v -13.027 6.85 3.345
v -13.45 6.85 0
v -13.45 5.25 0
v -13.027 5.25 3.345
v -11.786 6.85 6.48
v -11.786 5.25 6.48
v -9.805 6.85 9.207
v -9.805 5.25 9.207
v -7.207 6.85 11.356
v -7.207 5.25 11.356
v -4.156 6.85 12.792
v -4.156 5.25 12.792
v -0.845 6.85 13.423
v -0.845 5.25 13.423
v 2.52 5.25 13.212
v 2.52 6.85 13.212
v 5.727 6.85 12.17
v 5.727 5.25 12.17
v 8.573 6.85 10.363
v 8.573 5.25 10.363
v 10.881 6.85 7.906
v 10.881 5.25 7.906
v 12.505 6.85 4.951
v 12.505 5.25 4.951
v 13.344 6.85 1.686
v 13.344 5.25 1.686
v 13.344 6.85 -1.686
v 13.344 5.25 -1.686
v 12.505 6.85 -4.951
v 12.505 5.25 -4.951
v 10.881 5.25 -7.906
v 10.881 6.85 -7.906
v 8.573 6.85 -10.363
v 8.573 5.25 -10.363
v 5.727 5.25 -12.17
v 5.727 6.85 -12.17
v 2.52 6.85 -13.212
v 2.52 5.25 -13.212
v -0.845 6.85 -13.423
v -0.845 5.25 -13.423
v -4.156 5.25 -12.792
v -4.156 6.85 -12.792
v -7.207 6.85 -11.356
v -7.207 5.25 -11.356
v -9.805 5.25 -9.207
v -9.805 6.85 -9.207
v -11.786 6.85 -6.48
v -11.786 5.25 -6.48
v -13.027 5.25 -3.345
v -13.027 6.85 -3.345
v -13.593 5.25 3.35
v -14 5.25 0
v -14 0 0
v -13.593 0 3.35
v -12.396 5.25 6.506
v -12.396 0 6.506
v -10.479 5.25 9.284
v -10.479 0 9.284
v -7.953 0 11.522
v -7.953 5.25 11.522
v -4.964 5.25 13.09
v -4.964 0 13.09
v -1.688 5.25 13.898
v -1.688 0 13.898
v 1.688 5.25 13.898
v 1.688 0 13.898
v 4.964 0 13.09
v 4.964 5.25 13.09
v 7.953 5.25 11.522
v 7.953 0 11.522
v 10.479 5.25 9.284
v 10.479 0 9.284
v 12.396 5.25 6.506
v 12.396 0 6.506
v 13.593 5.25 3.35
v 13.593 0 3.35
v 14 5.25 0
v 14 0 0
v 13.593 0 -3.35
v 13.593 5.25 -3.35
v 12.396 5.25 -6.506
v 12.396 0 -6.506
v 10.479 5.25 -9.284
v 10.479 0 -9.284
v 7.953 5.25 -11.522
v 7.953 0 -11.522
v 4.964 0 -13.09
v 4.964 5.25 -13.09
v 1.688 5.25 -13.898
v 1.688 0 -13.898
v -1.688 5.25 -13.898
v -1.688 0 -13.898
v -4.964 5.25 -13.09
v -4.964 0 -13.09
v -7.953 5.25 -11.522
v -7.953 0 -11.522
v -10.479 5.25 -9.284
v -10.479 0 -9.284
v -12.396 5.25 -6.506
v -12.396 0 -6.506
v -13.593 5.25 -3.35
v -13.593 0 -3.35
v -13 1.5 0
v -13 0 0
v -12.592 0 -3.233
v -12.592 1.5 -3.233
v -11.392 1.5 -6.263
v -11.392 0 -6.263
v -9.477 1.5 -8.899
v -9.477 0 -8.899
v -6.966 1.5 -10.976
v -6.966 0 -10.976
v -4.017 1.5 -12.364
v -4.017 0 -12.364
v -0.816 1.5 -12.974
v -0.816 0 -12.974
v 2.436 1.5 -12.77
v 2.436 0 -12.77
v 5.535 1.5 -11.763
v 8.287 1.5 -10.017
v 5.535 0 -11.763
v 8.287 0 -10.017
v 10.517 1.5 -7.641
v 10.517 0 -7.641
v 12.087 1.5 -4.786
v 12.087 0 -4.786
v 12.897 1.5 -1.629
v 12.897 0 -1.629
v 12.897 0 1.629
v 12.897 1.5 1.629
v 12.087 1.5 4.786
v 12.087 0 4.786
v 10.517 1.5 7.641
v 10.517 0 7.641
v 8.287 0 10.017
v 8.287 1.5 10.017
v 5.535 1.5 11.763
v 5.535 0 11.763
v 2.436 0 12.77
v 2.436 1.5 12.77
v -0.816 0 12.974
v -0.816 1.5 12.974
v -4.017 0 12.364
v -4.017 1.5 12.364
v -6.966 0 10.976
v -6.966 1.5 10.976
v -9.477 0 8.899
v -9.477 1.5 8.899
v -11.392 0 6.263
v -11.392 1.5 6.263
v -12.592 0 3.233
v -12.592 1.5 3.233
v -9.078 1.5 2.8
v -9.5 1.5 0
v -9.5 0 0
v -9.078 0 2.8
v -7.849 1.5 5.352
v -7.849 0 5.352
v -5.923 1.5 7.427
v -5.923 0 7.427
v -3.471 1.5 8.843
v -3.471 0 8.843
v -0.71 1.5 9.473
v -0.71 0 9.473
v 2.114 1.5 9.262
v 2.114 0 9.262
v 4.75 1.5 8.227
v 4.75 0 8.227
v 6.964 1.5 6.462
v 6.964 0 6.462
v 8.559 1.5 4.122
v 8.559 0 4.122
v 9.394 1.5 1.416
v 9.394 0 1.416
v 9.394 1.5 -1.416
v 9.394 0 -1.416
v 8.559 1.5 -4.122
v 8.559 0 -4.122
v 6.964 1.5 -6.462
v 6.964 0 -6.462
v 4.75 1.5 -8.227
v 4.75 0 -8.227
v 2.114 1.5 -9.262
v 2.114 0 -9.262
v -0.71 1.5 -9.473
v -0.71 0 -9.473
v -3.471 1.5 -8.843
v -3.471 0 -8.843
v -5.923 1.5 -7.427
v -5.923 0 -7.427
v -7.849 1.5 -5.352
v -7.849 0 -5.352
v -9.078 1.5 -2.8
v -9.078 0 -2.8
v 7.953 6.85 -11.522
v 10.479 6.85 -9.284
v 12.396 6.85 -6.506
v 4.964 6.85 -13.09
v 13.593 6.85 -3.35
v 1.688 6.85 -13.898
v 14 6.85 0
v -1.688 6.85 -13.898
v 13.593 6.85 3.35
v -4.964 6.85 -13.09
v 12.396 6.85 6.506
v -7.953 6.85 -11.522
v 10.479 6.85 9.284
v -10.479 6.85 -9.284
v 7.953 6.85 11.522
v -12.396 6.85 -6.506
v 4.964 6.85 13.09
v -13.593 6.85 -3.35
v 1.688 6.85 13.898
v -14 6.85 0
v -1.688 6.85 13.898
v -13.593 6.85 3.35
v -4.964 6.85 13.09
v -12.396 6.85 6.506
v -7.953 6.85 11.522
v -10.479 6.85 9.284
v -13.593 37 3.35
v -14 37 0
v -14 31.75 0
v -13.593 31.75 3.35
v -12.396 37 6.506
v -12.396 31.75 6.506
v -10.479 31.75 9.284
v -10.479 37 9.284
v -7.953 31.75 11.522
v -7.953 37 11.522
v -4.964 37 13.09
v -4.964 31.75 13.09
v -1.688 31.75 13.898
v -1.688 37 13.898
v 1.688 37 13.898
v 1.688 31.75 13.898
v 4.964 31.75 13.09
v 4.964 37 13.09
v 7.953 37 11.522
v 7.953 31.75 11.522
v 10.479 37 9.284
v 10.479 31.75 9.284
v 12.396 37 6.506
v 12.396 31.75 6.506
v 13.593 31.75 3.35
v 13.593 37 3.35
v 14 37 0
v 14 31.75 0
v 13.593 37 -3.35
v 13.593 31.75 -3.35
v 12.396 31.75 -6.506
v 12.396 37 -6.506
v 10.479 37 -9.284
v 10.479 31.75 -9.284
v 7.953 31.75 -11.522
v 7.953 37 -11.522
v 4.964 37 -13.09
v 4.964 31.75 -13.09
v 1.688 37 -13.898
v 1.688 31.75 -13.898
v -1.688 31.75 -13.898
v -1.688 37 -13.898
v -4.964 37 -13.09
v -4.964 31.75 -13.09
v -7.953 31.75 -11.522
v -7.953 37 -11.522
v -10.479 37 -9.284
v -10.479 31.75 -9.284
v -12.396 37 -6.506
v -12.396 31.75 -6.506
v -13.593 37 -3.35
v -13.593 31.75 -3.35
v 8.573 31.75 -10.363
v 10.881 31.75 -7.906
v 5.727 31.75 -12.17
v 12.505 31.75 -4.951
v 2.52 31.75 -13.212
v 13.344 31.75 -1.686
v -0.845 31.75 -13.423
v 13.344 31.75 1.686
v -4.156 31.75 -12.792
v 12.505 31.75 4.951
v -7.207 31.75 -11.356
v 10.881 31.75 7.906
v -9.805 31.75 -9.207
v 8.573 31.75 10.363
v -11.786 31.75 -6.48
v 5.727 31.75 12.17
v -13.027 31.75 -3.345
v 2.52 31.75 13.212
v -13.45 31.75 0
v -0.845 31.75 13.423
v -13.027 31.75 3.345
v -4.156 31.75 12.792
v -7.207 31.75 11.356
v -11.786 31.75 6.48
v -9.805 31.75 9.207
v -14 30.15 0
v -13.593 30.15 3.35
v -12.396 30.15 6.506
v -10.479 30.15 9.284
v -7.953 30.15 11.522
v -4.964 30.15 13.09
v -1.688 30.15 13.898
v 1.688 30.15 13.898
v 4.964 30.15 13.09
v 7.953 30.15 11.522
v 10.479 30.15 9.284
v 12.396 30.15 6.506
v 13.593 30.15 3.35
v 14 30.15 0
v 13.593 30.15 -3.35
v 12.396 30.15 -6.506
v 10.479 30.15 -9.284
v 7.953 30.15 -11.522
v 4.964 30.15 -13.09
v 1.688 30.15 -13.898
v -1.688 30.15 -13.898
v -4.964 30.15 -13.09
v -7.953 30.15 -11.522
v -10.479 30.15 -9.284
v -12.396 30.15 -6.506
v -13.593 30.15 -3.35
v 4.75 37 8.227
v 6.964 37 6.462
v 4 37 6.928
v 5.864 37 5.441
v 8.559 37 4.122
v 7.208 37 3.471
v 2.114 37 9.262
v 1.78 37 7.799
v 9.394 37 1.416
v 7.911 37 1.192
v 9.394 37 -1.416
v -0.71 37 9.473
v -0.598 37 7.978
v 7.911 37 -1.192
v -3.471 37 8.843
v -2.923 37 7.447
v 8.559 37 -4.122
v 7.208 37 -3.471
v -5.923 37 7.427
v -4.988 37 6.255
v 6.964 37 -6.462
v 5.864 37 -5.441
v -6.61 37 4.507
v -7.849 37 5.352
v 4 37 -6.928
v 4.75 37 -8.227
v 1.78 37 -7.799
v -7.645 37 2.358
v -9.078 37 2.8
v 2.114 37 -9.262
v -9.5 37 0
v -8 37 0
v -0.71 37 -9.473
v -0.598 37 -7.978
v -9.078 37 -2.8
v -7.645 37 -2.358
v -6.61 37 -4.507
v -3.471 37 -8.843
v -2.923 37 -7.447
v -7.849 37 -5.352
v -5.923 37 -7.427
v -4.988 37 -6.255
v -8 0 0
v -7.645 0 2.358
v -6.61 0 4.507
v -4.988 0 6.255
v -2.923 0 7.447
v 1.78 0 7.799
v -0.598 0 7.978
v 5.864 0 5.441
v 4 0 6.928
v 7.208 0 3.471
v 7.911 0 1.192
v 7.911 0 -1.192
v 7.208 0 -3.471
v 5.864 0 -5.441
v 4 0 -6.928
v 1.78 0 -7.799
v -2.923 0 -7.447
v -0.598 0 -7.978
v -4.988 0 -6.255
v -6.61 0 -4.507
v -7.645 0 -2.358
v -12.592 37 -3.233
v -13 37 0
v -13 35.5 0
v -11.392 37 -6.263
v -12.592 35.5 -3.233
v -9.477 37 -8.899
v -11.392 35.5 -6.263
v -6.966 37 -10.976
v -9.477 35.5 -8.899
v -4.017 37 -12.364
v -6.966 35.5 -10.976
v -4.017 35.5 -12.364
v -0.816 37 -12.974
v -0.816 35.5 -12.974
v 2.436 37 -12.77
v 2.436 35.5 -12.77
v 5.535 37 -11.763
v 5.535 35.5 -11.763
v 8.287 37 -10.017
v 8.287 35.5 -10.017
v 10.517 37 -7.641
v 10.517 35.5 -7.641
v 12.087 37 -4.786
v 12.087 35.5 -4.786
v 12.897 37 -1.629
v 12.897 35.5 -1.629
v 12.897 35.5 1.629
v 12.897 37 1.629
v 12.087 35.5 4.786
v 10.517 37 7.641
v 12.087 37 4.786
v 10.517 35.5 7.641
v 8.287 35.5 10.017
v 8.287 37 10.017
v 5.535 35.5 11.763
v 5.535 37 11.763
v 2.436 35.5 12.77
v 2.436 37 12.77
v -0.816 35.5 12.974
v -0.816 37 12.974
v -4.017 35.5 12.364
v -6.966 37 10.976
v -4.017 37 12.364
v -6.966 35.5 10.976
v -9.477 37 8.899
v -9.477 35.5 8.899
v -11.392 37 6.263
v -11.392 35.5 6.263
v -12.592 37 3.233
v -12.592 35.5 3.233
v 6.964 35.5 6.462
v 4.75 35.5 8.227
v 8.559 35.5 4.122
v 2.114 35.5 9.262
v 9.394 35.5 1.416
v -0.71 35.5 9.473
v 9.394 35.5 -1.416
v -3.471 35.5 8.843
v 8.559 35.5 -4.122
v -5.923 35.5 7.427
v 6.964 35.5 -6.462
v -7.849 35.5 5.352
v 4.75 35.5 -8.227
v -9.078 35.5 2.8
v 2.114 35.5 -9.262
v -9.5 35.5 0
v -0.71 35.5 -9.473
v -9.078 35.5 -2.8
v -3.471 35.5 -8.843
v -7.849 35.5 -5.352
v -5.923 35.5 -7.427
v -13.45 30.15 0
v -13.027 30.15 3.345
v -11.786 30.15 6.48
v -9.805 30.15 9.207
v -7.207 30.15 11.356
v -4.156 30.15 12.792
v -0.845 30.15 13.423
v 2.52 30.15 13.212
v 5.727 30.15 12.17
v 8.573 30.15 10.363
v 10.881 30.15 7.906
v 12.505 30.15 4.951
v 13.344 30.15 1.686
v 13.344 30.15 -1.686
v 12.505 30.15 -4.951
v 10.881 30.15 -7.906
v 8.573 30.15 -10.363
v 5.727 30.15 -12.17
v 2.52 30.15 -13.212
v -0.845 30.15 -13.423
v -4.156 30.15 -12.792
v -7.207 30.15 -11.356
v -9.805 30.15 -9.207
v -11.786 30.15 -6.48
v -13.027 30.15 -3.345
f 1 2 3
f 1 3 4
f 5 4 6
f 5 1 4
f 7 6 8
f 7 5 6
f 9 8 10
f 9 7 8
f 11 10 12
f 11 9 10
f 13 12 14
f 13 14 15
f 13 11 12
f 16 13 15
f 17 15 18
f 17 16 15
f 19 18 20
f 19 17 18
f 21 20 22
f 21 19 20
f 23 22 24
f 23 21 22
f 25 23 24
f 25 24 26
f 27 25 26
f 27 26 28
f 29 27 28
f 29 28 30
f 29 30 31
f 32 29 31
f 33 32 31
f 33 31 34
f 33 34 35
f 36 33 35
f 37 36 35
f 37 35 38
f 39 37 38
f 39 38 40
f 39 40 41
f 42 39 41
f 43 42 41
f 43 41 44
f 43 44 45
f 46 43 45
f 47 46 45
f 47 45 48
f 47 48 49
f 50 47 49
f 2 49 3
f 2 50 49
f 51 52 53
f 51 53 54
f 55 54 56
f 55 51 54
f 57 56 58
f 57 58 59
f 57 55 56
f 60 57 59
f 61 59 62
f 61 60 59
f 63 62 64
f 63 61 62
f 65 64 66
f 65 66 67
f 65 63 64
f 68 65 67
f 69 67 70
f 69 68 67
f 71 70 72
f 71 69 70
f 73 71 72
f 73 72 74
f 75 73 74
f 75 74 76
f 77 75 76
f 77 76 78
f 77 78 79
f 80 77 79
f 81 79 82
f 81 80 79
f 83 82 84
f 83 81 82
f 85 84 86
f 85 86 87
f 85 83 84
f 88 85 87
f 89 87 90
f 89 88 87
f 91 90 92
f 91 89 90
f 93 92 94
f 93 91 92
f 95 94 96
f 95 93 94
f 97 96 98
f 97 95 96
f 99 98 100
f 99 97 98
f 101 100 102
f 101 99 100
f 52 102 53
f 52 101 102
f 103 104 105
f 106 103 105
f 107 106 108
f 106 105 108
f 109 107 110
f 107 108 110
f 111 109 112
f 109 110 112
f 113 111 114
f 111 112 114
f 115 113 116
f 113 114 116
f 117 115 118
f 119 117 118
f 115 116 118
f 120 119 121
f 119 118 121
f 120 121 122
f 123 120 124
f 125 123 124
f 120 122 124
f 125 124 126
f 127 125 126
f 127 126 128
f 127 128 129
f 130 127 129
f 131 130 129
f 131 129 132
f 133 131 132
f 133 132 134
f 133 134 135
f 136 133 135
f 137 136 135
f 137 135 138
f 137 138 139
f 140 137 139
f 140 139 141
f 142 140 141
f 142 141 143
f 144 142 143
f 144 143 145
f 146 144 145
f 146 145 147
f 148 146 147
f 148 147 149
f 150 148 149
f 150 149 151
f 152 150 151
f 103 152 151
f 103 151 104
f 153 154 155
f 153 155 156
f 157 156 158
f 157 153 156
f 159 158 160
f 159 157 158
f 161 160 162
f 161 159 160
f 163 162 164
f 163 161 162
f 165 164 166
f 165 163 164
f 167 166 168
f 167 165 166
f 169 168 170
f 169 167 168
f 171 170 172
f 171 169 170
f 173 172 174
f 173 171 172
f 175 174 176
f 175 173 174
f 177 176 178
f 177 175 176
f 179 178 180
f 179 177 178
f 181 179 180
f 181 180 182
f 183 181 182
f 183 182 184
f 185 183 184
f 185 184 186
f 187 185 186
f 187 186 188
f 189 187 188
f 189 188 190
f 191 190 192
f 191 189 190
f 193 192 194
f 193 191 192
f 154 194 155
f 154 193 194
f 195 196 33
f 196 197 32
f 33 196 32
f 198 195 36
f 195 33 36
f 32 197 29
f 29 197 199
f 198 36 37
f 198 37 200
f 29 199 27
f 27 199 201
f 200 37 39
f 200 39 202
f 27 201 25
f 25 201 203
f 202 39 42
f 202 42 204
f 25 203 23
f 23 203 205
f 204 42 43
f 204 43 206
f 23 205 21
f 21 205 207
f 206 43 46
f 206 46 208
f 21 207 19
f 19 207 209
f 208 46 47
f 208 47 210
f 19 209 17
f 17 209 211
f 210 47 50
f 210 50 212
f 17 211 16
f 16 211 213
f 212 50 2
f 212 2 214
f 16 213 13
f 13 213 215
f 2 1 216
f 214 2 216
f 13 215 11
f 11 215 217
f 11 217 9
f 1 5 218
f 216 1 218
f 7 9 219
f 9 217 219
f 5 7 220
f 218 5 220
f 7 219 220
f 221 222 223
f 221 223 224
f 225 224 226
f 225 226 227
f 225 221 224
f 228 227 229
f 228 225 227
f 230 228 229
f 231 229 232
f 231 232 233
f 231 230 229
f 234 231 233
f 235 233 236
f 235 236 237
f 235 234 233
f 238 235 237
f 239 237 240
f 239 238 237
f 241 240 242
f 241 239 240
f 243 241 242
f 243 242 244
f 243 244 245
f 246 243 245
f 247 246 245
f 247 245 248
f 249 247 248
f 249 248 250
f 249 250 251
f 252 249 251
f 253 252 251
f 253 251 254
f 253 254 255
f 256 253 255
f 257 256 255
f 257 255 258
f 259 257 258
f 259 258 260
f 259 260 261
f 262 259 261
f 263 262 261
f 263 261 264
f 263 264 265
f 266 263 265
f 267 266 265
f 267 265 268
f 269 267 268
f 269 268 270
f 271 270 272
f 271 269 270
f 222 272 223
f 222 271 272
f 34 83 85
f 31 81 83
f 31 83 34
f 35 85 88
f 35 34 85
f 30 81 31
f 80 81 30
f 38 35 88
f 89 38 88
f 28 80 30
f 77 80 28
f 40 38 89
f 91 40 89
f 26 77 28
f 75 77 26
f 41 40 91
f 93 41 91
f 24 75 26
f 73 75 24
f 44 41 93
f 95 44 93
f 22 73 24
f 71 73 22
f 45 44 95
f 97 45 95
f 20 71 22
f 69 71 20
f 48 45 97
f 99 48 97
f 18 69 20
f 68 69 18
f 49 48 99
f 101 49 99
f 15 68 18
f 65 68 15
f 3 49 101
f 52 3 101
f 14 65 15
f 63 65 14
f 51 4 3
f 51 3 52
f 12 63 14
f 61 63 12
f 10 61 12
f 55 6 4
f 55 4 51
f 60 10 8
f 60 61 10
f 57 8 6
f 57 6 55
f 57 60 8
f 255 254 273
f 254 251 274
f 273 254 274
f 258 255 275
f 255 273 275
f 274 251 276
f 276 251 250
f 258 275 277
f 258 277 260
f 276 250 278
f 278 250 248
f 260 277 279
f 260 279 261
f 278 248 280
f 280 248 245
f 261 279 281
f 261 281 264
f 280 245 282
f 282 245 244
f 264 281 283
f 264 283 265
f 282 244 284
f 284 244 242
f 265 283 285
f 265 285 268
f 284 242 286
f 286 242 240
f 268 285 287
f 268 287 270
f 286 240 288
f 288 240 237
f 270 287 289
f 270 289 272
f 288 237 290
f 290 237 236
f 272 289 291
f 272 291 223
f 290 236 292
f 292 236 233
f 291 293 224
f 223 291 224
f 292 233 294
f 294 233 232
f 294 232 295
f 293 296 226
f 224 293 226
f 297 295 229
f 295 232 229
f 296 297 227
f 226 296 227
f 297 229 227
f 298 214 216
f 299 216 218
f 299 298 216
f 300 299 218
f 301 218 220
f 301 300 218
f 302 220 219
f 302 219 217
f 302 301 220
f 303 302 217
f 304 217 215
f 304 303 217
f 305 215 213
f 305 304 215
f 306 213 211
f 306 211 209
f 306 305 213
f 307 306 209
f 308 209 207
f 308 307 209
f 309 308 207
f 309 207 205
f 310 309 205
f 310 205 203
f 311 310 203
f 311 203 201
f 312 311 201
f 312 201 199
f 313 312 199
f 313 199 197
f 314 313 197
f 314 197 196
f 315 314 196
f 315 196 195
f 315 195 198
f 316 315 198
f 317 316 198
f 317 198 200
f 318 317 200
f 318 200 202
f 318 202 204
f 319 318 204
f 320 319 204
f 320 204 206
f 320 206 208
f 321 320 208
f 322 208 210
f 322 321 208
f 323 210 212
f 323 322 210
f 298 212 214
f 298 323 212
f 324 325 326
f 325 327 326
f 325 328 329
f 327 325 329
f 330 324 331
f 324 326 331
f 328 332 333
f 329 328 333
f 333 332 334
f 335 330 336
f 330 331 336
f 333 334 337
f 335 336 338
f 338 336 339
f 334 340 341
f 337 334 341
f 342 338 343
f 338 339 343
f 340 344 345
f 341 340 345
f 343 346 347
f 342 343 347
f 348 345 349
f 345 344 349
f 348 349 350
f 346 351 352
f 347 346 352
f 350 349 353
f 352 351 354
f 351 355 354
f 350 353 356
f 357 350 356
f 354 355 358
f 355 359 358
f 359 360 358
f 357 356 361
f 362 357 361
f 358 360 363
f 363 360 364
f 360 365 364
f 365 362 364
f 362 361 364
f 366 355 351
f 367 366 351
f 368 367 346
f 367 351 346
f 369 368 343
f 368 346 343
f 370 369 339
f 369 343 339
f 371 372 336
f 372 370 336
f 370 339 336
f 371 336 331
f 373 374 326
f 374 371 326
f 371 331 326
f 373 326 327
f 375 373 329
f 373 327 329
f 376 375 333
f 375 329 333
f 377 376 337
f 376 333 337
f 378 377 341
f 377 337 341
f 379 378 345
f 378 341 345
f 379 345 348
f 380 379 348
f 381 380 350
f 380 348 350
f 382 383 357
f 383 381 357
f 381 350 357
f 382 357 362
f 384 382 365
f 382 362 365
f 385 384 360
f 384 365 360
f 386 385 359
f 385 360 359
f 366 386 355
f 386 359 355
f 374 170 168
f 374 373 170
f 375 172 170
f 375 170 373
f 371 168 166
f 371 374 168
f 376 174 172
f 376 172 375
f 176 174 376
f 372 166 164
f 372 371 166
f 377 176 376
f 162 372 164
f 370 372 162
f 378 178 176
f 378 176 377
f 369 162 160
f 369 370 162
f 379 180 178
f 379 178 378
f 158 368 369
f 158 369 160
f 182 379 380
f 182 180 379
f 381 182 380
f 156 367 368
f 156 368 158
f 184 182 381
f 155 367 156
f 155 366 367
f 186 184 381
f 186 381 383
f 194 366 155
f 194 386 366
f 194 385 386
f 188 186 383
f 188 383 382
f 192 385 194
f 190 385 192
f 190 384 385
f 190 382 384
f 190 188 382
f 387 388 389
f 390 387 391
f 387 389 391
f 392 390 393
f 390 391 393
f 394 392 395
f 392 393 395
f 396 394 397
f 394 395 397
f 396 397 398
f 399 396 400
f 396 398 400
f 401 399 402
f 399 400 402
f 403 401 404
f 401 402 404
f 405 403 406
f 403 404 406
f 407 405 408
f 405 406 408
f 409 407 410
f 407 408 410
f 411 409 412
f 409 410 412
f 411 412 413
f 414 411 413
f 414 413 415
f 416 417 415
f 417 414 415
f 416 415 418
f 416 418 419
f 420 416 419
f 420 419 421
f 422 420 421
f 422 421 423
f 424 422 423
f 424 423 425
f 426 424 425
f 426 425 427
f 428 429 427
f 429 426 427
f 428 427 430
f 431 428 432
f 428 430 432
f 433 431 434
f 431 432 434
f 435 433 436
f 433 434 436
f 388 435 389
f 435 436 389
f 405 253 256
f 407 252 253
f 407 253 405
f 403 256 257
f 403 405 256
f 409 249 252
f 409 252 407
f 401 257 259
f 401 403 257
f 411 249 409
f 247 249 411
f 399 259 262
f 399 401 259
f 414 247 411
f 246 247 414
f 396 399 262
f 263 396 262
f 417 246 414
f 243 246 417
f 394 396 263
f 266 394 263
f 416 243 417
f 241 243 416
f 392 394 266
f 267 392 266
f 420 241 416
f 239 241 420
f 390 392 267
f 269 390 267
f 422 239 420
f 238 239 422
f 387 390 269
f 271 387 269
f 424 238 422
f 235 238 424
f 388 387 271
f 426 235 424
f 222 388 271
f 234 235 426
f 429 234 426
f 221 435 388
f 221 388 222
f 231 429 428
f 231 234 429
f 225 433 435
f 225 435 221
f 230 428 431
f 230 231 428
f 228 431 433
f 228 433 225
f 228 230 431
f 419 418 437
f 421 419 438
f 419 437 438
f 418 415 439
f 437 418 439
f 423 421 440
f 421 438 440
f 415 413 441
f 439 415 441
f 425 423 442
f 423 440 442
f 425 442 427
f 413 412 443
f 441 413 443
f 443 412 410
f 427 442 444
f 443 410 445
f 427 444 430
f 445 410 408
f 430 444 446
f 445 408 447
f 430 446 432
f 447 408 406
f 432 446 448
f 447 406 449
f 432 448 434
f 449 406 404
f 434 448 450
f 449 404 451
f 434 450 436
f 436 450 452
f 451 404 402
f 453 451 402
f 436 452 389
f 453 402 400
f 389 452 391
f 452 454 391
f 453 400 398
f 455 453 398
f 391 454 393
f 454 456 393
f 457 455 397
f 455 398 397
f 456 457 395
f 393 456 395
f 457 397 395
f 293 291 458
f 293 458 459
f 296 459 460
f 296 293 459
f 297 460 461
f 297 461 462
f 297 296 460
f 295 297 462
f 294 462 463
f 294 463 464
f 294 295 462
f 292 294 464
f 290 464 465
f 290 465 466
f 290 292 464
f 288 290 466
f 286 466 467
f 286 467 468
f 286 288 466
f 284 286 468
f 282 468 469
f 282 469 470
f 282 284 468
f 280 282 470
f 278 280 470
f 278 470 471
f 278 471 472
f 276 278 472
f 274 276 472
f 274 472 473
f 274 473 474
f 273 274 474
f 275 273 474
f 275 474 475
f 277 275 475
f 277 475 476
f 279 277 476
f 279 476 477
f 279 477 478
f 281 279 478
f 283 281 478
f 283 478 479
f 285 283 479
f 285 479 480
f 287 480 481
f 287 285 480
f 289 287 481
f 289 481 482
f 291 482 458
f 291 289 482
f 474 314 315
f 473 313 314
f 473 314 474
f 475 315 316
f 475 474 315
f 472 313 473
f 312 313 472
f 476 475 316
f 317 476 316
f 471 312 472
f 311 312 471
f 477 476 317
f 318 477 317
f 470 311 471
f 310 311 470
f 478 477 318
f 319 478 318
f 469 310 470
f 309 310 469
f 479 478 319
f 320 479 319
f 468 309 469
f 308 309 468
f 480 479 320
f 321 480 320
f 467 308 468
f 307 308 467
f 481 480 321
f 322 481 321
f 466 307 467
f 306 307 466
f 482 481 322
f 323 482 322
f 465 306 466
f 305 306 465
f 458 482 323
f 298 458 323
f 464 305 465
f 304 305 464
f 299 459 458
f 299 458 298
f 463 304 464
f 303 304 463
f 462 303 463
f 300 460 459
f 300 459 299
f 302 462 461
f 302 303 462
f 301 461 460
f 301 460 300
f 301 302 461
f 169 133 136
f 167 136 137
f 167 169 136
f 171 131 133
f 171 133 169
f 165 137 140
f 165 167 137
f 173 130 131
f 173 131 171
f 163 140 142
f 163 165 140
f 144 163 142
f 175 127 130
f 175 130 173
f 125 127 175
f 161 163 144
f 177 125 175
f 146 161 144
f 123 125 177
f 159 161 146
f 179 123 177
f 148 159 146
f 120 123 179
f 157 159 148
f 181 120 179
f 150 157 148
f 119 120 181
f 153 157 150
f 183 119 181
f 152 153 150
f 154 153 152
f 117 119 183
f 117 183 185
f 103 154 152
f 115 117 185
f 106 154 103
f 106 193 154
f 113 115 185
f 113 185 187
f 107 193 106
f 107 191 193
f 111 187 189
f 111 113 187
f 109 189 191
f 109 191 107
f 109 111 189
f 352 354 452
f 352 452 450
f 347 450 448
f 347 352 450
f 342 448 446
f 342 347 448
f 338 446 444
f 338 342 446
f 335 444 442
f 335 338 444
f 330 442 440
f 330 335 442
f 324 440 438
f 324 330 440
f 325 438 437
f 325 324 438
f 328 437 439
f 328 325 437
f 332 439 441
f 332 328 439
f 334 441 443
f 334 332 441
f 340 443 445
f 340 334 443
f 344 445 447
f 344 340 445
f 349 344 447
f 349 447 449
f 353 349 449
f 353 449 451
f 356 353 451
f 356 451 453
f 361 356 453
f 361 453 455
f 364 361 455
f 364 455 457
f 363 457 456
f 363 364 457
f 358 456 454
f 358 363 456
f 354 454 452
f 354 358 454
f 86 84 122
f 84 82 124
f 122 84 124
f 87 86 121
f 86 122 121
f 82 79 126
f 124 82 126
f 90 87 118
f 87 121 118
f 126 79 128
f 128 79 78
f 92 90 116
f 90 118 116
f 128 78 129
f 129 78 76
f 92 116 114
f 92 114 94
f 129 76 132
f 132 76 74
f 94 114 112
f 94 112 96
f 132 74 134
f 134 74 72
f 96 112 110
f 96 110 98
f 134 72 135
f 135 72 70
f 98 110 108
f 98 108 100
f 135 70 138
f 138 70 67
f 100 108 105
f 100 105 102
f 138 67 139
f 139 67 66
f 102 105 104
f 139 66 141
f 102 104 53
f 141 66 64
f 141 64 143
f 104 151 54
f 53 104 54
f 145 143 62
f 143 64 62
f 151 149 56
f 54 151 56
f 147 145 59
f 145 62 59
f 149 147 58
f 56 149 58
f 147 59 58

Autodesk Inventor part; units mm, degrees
ref_plane "YZ Plane" through (0, 0, 0) normal (1, 0, 0) x (0, 1, 0)
ref_plane "XZ Plane" through (0, 0, 0) normal (0, 1, 0) x (-1, 0, 0)
ref_plane "XY Plane" through (0, 0, 0) normal (0, 0, 1) x (1, 0, 0)
sketch "Esboço1" plane through (0, 0, 0) normal (0, 0, 1) x (1, 0, 0)
  line L0 (-14, 0) -> (-14, 5.25)
  line L1 (-14, 5.25) -> (-13.45, 5.25)
  line L2 (-13.45, 5.25) -> (-13.45, 6.85)
  line L3 (-13.45, 6.85) -> (-14, 6.85)
  line L4 (-14, 6.85) -> (-14, 30.15)
  line L5 (-14, 30.15) -> (-13.45, 30.15)
  line L6 (-13.45, 30.15) -> (-13.45, 31.75)
  line L7 (-13.45, 31.75) -> (-14, 31.75)
  line L8 (-14, 31.75) -> (-14, 37)
  line L9 (-14, 37) -> (-13, 37)
  line L10 (-14, 0) -> (-13, 0)
  line L11 (-13, 0) -> (0, 0) construction
  line L12 (0, 0) -> (0, 37) construction
  line L13 (0, 37) -> (-13, 37) construction
  line L14 (-13, 37) -> (-13, 0)
  dimension "d0" = 13
  dimension "d1" = 37
  dimension "d4" = 0.55
  dimension "d5" = 1.6
  dimension "d6" = 1.6
  dimension "d8" = 1
  dimension "d26" = 26.5
  dimension "d27" = 5.25
sketch "Esboço3" plane through (0, 0, 0) normal (0, 0, 1) x (1, 0, 0)
  line L0 (0, 37) -> (0, 0) construction
  line L1 (0, 37) -> (0, 35.5) construction
  line L2 (0, 0) -> (0, 1.5) construction
  line L3 (-8, 0) -> (-8, 37)
  line L4 (-8, 0) -> (-9.5, 0)
  line L5 (-9.5, 37) -> (-8, 37)
  line L6 (-9.5, 1.5) -> (-13, 1.5)
  line L7 (-13, 1.5) -> (-13, 35.5)
  line L8 (-13, 35.5) -> (-9.5, 35.5)
  line L9 (-9.5, 0) -> (-9.5, 1.5)
  line L10 (-9.5, 35.5) -> (-9.5, 37)
  dimension "d28" = 37
  dimension "d30" = 8
  dimension "d31" = 34
  dimension "d32" = 37
  dimension "d33" = 1.5
  dimension "d34" = 5
  dimension "d36" = 1.5
  dimension "d37" = 1.5
revolve "Revolução1" add sketch "Esboço3" angle 360 about axis through (0, 37, 0) along (0, -1, 0)
revolve "Revolução2" add sketch "Esboço1" angle 360 about axis through (0, 0, 0) along (0, 1, 0)
equation "\"d33\" = -0.5 * d31 + 0.5 * d32"
equation "\"d37\" = d36"
equation "\"d6\" = d5"
equation "\"d27\" = -0.5 * d26 + 0.5 * d1"
properties part number "rolamento_linear_lm16uu.iam"
